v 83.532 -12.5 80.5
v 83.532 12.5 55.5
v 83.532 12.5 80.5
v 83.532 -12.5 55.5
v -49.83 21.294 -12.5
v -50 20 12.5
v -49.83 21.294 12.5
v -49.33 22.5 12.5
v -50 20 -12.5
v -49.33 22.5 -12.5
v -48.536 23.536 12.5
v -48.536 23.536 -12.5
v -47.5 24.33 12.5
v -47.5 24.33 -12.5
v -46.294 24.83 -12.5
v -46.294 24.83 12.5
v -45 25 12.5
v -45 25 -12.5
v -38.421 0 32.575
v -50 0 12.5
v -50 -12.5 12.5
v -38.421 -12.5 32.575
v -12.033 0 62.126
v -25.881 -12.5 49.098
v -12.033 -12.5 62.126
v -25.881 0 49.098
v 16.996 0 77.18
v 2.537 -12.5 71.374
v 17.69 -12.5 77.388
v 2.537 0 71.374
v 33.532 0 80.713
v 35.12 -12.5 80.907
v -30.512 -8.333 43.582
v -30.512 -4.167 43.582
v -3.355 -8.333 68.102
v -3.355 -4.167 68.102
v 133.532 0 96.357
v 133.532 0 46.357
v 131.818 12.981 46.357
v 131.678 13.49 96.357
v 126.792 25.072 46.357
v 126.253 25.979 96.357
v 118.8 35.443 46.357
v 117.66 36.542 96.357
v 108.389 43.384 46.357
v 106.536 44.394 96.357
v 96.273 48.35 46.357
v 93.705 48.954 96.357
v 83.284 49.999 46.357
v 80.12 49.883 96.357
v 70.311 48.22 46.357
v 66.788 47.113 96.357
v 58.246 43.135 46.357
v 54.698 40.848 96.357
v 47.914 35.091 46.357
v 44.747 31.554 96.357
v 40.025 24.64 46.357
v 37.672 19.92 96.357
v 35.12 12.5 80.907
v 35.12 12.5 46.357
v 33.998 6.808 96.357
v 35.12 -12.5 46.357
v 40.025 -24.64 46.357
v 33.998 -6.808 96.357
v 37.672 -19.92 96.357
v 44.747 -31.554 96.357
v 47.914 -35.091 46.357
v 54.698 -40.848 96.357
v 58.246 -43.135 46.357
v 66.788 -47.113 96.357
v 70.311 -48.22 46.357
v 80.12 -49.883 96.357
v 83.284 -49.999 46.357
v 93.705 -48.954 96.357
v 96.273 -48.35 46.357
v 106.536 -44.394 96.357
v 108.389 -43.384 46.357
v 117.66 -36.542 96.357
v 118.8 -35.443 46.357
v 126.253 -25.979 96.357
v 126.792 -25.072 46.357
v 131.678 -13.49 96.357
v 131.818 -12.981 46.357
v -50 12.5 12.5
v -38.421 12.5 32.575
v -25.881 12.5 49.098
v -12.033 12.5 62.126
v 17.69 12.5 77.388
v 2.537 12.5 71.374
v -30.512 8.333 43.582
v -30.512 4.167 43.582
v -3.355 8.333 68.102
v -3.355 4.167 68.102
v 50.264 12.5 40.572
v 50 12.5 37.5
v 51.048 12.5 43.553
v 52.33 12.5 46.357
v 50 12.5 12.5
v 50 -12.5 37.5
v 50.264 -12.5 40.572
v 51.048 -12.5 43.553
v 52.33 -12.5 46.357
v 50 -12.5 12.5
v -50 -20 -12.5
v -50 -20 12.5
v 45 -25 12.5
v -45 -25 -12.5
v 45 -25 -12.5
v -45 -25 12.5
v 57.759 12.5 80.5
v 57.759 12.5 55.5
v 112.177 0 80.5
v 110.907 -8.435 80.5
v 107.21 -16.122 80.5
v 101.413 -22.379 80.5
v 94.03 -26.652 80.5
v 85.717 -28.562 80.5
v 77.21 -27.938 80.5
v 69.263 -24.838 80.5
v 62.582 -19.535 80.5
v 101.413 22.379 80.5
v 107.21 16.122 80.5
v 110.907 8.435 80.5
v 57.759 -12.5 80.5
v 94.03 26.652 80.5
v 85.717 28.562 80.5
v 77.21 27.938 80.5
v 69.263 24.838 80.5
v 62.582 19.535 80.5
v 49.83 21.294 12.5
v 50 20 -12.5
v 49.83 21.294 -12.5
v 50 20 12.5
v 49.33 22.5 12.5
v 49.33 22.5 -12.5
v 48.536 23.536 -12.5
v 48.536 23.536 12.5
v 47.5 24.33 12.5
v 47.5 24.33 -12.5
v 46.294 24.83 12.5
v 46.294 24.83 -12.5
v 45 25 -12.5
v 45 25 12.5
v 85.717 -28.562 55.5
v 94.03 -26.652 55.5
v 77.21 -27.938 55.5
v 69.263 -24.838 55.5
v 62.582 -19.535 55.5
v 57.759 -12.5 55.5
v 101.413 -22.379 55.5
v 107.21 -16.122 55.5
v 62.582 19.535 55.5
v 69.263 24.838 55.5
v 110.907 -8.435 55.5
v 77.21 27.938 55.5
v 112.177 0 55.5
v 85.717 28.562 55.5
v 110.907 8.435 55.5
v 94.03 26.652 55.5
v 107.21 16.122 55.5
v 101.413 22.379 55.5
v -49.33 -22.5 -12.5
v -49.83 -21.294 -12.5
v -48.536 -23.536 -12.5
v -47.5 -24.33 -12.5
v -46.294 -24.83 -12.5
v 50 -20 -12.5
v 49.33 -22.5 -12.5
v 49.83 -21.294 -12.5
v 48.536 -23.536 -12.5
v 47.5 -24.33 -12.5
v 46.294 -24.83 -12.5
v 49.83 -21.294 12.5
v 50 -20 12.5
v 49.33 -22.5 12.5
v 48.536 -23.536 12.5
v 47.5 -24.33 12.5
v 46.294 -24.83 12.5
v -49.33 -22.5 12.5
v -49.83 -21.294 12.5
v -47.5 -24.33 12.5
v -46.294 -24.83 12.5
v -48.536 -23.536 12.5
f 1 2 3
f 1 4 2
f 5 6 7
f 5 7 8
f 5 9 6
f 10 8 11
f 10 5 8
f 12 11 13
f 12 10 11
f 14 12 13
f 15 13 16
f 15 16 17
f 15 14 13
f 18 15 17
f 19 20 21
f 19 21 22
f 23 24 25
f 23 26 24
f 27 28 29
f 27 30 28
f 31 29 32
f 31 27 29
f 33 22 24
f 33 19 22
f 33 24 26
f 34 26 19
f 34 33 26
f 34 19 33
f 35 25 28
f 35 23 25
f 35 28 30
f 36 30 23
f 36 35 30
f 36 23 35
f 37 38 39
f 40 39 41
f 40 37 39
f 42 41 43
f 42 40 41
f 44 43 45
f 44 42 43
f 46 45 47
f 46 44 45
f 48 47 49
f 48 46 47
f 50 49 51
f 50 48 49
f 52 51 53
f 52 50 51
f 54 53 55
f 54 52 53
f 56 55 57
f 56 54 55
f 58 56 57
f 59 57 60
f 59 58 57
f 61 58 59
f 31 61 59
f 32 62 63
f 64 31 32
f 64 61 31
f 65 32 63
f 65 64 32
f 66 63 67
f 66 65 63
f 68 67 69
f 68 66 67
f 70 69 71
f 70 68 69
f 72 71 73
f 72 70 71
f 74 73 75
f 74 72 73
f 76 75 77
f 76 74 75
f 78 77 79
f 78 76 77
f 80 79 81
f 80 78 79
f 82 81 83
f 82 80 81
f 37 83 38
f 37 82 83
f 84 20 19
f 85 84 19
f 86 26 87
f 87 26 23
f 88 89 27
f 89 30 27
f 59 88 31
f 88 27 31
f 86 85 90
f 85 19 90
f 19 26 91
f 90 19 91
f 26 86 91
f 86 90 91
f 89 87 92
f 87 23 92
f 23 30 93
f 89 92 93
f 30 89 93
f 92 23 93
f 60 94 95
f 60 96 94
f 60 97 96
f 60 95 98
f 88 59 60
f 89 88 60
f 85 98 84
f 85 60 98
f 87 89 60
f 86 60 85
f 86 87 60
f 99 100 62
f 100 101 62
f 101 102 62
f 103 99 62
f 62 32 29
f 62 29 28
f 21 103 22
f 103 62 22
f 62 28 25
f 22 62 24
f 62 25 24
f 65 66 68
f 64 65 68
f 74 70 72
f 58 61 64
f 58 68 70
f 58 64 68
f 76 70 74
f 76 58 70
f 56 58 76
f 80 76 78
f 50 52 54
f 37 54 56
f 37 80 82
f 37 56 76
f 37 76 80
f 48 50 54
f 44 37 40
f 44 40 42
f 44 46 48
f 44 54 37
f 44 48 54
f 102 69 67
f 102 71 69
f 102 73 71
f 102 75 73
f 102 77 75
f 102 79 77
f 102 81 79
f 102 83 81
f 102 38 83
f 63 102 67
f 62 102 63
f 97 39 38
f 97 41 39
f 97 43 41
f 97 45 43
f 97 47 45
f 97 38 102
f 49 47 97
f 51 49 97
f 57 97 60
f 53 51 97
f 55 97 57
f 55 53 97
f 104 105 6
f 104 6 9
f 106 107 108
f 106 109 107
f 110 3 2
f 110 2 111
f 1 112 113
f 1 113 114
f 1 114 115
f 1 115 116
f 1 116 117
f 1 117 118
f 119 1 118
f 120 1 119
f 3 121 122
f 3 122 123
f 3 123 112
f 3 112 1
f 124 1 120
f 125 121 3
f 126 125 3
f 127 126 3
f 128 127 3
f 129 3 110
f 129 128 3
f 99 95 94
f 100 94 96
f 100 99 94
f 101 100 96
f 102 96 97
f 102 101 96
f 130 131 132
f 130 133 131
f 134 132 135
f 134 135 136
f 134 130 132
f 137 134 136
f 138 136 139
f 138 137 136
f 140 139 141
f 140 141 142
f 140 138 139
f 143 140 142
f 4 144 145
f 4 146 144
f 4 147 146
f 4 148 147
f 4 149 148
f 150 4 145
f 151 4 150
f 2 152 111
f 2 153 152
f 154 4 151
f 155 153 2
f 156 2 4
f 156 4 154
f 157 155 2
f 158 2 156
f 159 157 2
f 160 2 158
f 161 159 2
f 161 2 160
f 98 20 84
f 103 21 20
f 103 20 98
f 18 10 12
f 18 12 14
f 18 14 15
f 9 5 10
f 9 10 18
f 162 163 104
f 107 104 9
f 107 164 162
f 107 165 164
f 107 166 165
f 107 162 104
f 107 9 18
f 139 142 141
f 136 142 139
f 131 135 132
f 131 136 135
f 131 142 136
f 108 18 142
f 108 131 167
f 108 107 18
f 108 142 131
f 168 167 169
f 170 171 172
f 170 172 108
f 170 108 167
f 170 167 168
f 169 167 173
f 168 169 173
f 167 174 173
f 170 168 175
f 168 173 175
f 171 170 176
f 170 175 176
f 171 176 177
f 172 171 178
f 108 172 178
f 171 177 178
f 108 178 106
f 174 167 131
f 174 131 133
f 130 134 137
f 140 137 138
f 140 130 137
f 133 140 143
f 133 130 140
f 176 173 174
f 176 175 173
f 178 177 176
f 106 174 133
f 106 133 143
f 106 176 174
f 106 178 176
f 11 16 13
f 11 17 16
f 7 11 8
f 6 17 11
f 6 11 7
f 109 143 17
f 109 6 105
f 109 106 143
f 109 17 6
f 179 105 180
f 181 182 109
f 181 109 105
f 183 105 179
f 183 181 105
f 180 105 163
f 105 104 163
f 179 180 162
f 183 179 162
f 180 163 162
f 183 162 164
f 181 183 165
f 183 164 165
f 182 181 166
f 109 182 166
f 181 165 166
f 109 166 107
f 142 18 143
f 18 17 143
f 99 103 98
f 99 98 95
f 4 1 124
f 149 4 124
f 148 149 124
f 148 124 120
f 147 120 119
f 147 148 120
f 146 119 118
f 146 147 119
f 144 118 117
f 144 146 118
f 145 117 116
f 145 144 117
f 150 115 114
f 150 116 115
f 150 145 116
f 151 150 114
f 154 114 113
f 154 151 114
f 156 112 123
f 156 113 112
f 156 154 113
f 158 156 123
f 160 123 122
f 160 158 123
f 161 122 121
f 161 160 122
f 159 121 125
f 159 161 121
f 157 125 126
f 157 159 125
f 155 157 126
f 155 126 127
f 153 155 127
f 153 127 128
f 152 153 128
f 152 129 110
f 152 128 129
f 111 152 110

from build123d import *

# Parameters (mm, degrees)
F1_DEPTH = 25
F2_DEPTH = 12.5
F4_R     = 5


with BuildPart() as f1:
    # F0 (on Front) → F1 (new body, symmetric)
    with BuildSketch(Plane.XZ):
        Polygon((25, 12.5), (-50, 12.5), (-50, -12.5), (50, -12.5), (50, 12.5), align=None)
    extrude(amount=F1_DEPTH, both=True)

    # F4
    f4_edges = [f1.edges().sort_by_distance(p)[0] for p in [
        (-50, -25, 0),
        (50, -25, 0),
        (50, 25, 0),
        (-50, 25, 0),
    ]]
    fillet(f4_edges, radius=F4_R)


with BuildPart() as f2:
    # F0 (on Front) → F2 (new body, symmetric)
    with BuildSketch(Plane.XZ):
        with BuildLine():
            add(Edge.make_bspline(
                [(-50, 12.5), (-29.468646, 52.234761), (0, 88.832878), (68, 80.5)],
                knots=[0, 0, 0, 0, 136.191042, 136.191042, 136.191042, 136.191042], degree=3))
            Line((-50, 12.5), (25, 12.5))
            Line((25, 12.5), (25, 37.5))
            ThreePointArc((25, 37.5), (37.594408, 67.905592), (68, 80.5))
        make_face()
        with BuildLine():
            Line((25, 37.5), (25, 12.5))
            Line((25, 12.5), (50, 12.5))
            Line((50, 12.5), (50, 37.5))
            ThreePointArc((50, 37.5), (55.272078, 50.227922), (68, 55.5))
            Line((68, 55.5), (83.532405, 55.5))
            Line((83.532405, 55.5), (83.532405, 80.5))
            Line((83.532405, 80.5), (68, 80.5))
            ThreePointArc((68, 80.5), (37.594408, 67.905592), (25, 37.5))
        make_face()
    extrude(amount=F2_DEPTH, both=True)

    # F0 (on Front) → F3 (revolve)
    with BuildSketch(Plane.XZ):
        Polygon((83.532405, 96.357065), (83.532405, 80.5), (112.17733, 80.5), (112.17733, 55.5), (83.532405, 55.5), (83.532405, 46.357065), (133.532405, 46.357065), (133.532405, 96.357065), align=None)
    revolve(axis=Axis((83.532405, 0, 71.357065), (0, 0, 1)))


solid = Compound([f1.part, f2.part])
